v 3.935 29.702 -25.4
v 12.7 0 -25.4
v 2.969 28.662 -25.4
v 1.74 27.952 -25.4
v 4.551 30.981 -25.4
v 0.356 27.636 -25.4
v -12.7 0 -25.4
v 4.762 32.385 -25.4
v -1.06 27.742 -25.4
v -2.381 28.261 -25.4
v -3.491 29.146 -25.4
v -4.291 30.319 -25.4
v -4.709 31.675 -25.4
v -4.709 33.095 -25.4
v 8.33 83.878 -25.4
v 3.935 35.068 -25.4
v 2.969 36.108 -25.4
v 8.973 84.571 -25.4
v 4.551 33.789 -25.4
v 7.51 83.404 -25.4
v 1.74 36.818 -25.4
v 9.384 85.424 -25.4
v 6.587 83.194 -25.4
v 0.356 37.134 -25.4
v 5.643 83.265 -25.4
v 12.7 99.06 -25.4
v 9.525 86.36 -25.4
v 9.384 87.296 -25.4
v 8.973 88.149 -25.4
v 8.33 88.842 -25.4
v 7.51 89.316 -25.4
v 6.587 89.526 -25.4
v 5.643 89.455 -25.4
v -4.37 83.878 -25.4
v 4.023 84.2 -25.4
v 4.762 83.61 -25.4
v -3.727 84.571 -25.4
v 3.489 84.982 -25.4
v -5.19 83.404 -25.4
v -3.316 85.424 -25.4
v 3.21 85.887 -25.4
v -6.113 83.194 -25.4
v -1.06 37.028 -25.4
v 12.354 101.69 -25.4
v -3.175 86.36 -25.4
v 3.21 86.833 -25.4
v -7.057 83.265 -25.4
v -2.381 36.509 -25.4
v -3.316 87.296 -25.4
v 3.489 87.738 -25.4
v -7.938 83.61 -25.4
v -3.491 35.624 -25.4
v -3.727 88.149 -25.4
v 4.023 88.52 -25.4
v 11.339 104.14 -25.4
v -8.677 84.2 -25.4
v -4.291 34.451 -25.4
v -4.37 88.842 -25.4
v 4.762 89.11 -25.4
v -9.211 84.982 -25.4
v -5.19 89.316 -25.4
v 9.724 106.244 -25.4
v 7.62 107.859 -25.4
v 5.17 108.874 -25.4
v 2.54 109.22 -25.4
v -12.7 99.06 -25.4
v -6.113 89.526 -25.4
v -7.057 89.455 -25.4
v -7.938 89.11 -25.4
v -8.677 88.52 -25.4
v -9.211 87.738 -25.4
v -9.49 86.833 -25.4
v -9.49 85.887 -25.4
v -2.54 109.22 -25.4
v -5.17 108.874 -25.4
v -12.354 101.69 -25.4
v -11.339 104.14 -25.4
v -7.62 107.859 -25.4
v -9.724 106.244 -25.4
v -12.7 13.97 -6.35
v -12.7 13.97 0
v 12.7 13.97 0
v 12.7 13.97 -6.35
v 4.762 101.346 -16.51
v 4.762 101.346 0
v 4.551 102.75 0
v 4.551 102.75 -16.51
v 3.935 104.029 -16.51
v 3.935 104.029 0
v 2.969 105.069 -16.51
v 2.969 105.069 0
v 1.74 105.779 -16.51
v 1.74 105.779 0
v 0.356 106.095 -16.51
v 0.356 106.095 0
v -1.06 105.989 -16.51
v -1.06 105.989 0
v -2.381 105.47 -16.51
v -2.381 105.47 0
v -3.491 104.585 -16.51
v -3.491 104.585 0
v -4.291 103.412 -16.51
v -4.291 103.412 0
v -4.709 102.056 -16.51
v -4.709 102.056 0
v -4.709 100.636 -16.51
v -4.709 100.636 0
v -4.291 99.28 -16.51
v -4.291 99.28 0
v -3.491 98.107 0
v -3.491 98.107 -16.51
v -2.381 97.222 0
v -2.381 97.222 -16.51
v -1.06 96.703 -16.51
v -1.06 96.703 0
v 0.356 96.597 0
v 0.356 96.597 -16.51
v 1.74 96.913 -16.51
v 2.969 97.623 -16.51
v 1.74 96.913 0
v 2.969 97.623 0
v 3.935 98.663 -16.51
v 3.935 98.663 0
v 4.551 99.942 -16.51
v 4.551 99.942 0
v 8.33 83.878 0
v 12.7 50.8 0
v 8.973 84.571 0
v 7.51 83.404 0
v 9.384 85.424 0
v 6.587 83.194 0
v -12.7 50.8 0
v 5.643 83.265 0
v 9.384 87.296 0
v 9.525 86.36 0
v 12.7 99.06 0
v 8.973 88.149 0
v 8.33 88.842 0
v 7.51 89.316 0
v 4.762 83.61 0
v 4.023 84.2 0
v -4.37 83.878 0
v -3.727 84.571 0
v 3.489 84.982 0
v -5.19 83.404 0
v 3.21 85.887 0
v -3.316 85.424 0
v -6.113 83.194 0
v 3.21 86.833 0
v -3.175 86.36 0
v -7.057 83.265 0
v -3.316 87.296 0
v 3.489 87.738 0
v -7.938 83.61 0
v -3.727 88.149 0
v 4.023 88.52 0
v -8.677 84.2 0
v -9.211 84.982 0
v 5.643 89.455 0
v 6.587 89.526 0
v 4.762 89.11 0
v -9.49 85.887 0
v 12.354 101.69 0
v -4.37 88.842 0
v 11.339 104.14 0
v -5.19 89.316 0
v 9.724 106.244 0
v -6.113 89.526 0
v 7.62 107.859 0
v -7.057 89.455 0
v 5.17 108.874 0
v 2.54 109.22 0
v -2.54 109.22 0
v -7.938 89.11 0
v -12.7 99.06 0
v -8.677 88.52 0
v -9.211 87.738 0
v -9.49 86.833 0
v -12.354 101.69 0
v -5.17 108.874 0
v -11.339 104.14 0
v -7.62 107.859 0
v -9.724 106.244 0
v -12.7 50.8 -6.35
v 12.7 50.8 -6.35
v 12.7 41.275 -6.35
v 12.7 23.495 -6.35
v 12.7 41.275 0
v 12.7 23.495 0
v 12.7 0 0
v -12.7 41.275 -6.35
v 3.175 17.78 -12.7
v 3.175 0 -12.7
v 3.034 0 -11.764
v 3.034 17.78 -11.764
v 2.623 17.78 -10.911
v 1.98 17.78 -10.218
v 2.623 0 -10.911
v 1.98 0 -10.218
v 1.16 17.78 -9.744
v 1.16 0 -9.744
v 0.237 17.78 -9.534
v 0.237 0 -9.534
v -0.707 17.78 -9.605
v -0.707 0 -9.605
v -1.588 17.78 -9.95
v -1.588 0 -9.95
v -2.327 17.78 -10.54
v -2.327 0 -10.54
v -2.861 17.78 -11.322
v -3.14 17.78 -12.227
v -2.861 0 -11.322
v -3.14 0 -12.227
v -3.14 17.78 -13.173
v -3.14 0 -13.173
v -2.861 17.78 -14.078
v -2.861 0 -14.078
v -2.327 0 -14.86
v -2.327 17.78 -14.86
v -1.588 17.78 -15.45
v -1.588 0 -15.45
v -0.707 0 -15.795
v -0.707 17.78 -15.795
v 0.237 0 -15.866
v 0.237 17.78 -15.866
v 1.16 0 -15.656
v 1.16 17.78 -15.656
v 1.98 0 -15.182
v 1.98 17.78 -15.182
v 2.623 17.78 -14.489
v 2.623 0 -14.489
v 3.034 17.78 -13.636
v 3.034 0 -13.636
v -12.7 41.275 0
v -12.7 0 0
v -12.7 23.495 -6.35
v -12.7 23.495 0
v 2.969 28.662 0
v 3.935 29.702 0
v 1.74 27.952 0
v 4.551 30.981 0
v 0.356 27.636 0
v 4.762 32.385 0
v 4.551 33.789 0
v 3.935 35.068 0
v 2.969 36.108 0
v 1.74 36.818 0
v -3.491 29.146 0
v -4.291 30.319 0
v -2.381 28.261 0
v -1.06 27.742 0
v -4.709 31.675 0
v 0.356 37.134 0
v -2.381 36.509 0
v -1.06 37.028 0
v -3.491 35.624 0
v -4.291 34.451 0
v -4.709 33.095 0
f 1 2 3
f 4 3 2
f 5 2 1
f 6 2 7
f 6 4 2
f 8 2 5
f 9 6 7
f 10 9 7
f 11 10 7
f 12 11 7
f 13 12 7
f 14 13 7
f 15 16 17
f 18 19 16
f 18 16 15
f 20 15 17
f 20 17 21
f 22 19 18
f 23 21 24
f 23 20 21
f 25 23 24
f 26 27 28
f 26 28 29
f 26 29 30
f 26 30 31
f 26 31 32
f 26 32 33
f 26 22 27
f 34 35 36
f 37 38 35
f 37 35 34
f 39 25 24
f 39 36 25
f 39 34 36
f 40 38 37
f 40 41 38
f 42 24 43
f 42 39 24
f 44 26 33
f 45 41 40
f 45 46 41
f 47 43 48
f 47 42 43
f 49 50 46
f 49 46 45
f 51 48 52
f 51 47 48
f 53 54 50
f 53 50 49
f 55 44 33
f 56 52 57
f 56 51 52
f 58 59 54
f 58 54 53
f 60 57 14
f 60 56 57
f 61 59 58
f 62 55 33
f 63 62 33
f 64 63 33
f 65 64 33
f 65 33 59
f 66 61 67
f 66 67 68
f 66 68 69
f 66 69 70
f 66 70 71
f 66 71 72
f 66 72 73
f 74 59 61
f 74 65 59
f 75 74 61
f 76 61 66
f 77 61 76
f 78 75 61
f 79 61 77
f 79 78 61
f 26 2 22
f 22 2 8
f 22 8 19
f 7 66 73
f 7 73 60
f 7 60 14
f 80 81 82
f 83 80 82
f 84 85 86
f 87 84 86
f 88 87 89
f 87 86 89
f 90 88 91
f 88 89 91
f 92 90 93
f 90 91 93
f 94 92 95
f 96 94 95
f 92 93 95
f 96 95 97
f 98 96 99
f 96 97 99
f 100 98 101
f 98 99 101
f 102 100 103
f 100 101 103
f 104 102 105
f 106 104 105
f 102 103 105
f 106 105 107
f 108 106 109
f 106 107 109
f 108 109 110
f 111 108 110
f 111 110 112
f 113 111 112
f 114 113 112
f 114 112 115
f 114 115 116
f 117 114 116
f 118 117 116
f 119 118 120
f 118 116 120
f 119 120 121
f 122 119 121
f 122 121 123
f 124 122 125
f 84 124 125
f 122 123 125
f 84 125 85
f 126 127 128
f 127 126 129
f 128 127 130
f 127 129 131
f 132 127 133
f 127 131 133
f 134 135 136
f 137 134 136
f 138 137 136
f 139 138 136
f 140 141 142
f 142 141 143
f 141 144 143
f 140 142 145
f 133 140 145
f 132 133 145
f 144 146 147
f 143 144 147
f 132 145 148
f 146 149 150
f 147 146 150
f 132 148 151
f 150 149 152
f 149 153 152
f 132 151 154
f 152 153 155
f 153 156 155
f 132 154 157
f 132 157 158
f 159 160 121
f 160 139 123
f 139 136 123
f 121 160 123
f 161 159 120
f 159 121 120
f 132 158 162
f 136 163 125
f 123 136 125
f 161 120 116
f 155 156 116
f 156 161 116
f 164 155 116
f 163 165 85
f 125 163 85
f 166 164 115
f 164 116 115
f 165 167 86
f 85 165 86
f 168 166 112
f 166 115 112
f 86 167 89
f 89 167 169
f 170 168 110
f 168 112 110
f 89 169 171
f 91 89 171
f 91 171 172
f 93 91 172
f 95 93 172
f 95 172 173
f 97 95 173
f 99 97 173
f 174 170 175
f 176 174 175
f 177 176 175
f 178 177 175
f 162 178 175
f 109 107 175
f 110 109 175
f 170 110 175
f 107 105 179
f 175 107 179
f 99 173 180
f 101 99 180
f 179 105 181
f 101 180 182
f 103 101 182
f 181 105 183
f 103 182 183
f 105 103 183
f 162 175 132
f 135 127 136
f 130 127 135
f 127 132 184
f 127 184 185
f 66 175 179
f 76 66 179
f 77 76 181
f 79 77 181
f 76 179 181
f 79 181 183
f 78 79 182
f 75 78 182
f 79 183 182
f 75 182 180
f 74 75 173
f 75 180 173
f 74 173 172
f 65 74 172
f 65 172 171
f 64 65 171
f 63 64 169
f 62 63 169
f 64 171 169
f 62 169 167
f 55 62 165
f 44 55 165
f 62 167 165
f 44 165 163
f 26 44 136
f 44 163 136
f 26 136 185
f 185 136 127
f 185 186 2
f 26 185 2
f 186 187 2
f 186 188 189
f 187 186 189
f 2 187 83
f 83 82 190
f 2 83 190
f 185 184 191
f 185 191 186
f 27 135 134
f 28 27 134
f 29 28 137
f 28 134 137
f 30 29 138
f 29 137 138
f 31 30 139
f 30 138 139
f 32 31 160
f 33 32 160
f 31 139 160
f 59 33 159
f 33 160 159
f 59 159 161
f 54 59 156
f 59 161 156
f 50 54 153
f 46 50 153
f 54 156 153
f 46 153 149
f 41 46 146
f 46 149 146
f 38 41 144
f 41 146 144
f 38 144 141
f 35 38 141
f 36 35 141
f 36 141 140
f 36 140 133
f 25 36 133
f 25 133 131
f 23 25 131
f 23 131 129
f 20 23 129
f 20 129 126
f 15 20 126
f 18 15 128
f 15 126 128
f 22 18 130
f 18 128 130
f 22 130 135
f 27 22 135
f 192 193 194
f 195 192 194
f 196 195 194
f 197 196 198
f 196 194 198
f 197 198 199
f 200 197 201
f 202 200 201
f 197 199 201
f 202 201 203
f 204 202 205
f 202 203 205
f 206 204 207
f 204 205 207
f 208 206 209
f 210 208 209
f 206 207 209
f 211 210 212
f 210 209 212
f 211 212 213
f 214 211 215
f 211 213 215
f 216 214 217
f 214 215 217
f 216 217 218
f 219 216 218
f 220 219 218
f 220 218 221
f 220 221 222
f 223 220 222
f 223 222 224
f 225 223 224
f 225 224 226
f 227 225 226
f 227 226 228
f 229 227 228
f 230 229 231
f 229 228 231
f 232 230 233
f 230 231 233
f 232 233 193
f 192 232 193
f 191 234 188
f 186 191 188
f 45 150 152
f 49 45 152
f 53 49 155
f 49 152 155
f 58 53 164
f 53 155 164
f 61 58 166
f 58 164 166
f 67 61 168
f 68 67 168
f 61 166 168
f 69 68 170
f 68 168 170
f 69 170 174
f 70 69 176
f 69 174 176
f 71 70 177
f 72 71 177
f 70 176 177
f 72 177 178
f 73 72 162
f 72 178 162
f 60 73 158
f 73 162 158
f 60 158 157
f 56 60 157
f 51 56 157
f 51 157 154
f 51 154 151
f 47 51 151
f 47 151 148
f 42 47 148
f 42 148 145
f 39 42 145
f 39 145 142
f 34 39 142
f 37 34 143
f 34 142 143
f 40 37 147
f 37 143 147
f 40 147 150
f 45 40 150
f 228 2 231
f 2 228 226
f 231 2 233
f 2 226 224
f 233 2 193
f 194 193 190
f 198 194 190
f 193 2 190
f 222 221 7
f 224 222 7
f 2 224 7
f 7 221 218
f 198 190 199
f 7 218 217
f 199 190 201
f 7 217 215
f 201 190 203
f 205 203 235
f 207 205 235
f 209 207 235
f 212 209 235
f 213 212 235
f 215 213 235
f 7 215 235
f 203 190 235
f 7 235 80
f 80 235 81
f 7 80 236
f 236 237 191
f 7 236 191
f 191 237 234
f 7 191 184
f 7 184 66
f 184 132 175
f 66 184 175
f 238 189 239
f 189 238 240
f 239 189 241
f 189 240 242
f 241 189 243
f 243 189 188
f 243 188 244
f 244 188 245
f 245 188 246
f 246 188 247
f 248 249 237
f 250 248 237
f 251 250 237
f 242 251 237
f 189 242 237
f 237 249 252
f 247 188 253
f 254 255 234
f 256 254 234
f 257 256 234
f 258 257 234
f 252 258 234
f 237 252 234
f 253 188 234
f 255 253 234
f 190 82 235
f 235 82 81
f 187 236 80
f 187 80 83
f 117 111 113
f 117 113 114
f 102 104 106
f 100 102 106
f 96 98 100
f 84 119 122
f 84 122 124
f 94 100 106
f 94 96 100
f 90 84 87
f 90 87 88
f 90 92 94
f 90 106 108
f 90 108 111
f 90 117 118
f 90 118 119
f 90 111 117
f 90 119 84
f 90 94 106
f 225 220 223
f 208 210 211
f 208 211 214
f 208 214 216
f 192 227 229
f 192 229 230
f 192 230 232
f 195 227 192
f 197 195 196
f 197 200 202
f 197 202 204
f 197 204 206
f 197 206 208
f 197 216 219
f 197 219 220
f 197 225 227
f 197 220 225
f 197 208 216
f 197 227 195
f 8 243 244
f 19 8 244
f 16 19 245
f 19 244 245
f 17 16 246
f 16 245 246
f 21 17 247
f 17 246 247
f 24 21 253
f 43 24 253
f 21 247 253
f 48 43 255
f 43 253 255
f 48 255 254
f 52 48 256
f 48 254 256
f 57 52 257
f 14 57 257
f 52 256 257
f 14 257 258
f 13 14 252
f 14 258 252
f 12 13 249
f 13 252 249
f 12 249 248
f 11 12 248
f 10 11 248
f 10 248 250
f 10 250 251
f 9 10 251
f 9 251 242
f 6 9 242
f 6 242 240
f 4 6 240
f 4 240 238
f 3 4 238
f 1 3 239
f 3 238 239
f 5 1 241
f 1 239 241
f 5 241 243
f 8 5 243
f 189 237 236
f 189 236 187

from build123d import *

# Parameters (mm, degrees)
SKETCH1_R           = 4.7625
SKETCH1_R_2         = 3.175
BOSS_EXTRUDE1_DEPTH = 25.4
SKETCH1_3_R         = 4.7625
CUT_EXTRUDE1_DEPTH  = 16.51
SKETCH2_R           = 3.175
CUT_EXTRUDE2_DEPTH  = 17.78
SKETCH3_W           = 25.4
SKETCH3_H           = 9.525
CUT_EXTRUDE3_DEPTH  = 6.35


with BuildPart() as part:
    # Sketch1 → Boss-Extrude1 (new body)
    with BuildSketch(Plane.XY):
        with BuildLine():
            ThreePointArc((-12.7, 99.06), (-9.724204897, 106.244204897), (-2.54, 109.22))
            Line((-2.54, 109.22), (2.54, 109.22))
            ThreePointArc((2.54, 109.22), (9.724204897, 106.244204897), (12.7, 99.06))
            Line((12.7, 99.06), (12.7, 0))
            Line((12.7, 0), (-12.7, 0))
            Line((-12.7, 0), (-12.7, 99.06))
        make_face()
        with Locations((0, 101.346)):
            Circle(SKETCH1_R, mode=Mode.SUBTRACT)
        with Locations((6.35, 86.36)):
            Circle(SKETCH1_R_2, mode=Mode.SUBTRACT)
        with Locations((-6.35, 86.36)):
            Circle(SKETCH1_R_2, mode=Mode.SUBTRACT)
        with Locations((0, 32.385)):
            Circle(SKETCH1_R, mode=Mode.SUBTRACT)
        with Locations((0, 101.346)):
            Circle(SKETCH1_R)
    extrude(amount=-BOSS_EXTRUDE1_DEPTH)

    # Sketch1_3 → Cut-Extrude1 (cut)
    with BuildSketch(Plane.XY):
        with Locations((0, 101.346)):
            Circle(SKETCH1_3_R)
    extrude(amount=-CUT_EXTRUDE1_DEPTH, mode=Mode.SUBTRACT)

    # Sketch2 → Cut-Extrude2 (cut)
    with BuildSketch(Plane.XZ):
        with Locations((0, -12.7)):
            Circle(SKETCH2_R)
    extrude(amount=-CUT_EXTRUDE2_DEPTH, mode=Mode.SUBTRACT)

    # Sketch3 → Cut-Extrude3 (cut)
    with BuildSketch(Plane.XY):
        with Locations((0, 46.0375)):
            Rectangle(SKETCH3_W, SKETCH3_H)
        with Locations((0, 18.7325)):
            Rectangle(SKETCH3_W, SKETCH3_H)
    extrude(amount=-CUT_EXTRUDE3_DEPTH, mode=Mode.SUBTRACT)


solid = part.part
